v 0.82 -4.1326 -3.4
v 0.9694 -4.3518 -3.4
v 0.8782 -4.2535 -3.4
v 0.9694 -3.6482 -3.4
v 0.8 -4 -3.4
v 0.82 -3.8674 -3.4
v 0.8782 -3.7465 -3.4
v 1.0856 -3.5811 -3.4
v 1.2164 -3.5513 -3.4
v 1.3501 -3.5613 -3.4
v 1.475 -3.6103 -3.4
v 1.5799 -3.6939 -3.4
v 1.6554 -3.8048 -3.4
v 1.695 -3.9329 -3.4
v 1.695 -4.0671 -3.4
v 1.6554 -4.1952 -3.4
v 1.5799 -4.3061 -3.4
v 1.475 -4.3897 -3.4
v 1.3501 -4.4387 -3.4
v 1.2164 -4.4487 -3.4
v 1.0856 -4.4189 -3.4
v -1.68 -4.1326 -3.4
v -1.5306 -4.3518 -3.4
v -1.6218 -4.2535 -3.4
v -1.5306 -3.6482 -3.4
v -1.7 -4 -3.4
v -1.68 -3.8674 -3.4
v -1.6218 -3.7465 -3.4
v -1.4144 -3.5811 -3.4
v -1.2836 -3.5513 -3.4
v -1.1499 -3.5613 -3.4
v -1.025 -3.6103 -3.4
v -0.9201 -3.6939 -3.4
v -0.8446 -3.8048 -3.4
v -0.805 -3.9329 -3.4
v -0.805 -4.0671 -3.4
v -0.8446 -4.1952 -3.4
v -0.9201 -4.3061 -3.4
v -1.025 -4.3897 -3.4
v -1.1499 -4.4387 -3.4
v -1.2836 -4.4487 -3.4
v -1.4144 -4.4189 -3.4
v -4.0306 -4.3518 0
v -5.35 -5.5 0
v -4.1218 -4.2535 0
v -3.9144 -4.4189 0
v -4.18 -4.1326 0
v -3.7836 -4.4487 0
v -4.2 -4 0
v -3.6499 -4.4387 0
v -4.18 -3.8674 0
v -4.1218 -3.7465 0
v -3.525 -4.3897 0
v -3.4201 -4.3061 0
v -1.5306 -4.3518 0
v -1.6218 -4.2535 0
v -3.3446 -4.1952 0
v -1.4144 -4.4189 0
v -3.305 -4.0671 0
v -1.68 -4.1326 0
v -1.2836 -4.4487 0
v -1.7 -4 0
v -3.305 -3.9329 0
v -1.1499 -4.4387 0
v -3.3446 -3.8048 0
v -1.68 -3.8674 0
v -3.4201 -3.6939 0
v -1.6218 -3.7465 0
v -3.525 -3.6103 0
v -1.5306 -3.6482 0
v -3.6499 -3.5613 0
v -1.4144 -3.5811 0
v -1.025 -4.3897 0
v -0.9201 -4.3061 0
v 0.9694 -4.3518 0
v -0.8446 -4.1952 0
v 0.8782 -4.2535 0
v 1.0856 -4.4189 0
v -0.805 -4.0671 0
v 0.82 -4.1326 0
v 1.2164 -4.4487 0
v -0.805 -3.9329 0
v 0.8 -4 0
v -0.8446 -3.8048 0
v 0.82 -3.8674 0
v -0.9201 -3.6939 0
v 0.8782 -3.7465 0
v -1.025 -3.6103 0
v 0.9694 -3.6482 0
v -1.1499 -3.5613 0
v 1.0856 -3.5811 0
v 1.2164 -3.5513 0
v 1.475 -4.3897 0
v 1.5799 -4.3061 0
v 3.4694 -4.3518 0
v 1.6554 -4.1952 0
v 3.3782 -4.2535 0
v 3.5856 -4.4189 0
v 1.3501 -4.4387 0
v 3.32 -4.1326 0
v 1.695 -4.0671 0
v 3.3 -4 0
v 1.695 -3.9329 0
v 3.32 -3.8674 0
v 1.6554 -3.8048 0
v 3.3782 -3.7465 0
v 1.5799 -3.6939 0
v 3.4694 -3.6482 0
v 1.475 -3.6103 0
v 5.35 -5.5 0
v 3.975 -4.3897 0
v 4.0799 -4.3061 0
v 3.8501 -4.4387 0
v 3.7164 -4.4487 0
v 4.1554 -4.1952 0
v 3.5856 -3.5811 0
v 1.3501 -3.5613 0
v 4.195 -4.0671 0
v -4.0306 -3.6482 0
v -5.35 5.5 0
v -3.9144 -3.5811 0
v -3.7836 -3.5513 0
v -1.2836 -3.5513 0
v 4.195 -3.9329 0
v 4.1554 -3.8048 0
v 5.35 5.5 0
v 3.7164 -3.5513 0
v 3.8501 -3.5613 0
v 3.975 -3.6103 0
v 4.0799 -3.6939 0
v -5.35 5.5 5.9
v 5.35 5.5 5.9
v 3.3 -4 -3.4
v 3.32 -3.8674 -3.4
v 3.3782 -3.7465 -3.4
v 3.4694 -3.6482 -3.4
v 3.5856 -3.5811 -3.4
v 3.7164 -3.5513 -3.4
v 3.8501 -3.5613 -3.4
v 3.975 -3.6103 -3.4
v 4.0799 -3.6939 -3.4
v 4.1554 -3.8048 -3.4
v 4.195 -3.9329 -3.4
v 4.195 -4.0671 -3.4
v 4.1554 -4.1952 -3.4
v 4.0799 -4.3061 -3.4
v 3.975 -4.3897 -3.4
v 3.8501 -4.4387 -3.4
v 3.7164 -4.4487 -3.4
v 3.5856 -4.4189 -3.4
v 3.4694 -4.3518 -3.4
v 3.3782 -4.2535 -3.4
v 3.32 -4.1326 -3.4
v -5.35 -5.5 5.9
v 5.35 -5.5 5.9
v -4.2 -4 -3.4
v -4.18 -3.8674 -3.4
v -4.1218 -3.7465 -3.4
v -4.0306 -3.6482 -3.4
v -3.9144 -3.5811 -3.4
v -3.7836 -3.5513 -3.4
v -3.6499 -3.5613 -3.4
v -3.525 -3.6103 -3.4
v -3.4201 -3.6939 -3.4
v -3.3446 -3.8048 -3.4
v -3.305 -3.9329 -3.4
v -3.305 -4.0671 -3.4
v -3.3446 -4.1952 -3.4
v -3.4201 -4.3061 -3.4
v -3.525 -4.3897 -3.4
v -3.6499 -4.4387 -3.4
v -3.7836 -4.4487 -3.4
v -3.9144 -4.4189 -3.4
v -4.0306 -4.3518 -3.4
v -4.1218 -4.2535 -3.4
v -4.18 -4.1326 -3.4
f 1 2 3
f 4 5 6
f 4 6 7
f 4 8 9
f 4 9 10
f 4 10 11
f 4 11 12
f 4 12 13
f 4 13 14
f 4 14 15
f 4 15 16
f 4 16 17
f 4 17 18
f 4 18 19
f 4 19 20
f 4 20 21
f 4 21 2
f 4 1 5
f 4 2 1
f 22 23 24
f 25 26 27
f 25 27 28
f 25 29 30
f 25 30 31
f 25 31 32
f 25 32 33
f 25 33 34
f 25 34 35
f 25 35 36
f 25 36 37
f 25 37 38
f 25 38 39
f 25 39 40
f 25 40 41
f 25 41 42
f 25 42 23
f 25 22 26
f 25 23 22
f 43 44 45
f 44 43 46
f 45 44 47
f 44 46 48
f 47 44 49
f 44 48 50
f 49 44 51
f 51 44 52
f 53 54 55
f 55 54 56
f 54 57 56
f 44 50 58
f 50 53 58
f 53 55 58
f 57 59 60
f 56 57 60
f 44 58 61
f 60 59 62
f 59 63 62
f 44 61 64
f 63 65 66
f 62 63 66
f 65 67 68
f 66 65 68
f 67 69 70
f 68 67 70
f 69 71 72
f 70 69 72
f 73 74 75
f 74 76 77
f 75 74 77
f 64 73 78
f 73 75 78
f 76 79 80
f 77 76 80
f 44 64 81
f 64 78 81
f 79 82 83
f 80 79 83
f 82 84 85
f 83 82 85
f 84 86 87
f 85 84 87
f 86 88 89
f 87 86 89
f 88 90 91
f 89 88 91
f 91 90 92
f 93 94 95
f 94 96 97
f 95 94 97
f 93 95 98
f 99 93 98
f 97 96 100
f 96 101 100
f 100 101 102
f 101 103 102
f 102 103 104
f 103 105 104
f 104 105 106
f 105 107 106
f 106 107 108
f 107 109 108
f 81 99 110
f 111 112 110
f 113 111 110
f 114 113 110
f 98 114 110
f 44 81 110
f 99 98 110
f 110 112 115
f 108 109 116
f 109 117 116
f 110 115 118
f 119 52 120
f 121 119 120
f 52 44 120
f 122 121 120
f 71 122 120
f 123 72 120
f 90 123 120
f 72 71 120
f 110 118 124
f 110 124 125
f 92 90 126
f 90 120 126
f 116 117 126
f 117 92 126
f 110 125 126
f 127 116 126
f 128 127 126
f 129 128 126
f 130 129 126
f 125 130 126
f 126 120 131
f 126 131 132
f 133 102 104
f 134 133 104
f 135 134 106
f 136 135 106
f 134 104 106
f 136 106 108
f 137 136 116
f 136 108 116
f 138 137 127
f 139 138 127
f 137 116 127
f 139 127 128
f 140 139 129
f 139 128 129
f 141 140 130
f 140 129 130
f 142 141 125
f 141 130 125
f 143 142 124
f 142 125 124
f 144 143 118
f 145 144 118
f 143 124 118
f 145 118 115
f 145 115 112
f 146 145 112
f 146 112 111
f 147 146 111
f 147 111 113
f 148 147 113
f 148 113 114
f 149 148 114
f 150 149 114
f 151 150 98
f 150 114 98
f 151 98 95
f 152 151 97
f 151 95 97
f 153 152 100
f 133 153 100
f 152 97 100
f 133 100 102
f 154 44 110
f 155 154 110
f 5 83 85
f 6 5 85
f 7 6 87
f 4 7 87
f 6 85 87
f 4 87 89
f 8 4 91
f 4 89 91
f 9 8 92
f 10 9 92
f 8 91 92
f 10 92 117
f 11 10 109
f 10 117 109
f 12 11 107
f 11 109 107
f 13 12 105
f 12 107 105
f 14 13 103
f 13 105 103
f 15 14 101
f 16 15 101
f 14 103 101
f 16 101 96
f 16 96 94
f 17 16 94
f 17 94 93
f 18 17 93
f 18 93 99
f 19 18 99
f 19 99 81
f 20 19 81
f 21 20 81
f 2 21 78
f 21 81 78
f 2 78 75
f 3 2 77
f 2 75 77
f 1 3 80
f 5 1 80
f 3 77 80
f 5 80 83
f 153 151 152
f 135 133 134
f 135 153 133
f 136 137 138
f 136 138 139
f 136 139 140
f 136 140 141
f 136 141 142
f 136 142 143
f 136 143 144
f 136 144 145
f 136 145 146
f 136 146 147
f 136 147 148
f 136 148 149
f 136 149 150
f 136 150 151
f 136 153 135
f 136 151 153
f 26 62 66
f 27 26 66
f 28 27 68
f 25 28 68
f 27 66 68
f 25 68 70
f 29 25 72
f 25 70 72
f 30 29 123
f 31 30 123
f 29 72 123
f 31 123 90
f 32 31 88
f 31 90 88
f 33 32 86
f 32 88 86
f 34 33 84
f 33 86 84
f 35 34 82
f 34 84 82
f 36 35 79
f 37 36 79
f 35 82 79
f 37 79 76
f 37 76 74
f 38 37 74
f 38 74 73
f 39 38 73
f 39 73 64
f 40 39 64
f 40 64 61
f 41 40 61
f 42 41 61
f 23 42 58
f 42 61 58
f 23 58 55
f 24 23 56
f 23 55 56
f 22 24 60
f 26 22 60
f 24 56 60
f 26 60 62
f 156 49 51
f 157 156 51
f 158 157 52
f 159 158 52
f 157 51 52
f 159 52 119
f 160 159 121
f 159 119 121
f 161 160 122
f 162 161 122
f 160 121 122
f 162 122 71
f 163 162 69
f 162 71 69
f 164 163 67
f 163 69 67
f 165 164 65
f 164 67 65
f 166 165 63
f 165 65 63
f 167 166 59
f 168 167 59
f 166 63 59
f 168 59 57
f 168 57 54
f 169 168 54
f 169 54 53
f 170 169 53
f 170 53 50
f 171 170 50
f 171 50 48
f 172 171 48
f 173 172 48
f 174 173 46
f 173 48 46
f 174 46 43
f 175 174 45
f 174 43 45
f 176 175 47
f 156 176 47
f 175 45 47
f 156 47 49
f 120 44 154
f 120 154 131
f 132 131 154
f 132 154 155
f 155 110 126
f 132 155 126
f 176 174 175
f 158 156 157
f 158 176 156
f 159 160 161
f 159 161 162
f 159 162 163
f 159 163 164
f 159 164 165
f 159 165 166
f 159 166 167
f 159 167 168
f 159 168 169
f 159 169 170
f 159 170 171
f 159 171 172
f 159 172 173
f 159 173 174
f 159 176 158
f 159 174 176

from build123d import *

# Parameters (mm, degrees)
SKETCH1_W           = 10.7
SKETCH1_H           = 11
BOSS_EXTRUDE1_DEPTH = 5.9
SKETCH2_R           = 0.45
BOSS_EXTRUDE2_DEPTH = 3.4


with BuildPart() as part:
    # Sketch1 → Boss-Extrude1 (new body)
    with BuildSketch(Plane.XY):
        Rectangle(SKETCH1_W, SKETCH1_H)
    extrude(amount=BOSS_EXTRUDE1_DEPTH)

    # Sketch2 → Boss-Extrude2 (add)
    with BuildSketch(Plane(origin=(0, 0, 0), x_dir=(-1, 0, 0), z_dir=(0, 0, -1))):
        with Locations((-3.75, -4)):
            Circle(SKETCH2_R)
        with Locations((-1.25, -4)):
            Circle(SKETCH2_R)
        with Locations((1.25, -4)):
            Circle(SKETCH2_R)
        with Locations((3.75, -4)):
            Circle(SKETCH2_R)
    extrude(amount=BOSS_EXTRUDE2_DEPTH)


solid = part.part
